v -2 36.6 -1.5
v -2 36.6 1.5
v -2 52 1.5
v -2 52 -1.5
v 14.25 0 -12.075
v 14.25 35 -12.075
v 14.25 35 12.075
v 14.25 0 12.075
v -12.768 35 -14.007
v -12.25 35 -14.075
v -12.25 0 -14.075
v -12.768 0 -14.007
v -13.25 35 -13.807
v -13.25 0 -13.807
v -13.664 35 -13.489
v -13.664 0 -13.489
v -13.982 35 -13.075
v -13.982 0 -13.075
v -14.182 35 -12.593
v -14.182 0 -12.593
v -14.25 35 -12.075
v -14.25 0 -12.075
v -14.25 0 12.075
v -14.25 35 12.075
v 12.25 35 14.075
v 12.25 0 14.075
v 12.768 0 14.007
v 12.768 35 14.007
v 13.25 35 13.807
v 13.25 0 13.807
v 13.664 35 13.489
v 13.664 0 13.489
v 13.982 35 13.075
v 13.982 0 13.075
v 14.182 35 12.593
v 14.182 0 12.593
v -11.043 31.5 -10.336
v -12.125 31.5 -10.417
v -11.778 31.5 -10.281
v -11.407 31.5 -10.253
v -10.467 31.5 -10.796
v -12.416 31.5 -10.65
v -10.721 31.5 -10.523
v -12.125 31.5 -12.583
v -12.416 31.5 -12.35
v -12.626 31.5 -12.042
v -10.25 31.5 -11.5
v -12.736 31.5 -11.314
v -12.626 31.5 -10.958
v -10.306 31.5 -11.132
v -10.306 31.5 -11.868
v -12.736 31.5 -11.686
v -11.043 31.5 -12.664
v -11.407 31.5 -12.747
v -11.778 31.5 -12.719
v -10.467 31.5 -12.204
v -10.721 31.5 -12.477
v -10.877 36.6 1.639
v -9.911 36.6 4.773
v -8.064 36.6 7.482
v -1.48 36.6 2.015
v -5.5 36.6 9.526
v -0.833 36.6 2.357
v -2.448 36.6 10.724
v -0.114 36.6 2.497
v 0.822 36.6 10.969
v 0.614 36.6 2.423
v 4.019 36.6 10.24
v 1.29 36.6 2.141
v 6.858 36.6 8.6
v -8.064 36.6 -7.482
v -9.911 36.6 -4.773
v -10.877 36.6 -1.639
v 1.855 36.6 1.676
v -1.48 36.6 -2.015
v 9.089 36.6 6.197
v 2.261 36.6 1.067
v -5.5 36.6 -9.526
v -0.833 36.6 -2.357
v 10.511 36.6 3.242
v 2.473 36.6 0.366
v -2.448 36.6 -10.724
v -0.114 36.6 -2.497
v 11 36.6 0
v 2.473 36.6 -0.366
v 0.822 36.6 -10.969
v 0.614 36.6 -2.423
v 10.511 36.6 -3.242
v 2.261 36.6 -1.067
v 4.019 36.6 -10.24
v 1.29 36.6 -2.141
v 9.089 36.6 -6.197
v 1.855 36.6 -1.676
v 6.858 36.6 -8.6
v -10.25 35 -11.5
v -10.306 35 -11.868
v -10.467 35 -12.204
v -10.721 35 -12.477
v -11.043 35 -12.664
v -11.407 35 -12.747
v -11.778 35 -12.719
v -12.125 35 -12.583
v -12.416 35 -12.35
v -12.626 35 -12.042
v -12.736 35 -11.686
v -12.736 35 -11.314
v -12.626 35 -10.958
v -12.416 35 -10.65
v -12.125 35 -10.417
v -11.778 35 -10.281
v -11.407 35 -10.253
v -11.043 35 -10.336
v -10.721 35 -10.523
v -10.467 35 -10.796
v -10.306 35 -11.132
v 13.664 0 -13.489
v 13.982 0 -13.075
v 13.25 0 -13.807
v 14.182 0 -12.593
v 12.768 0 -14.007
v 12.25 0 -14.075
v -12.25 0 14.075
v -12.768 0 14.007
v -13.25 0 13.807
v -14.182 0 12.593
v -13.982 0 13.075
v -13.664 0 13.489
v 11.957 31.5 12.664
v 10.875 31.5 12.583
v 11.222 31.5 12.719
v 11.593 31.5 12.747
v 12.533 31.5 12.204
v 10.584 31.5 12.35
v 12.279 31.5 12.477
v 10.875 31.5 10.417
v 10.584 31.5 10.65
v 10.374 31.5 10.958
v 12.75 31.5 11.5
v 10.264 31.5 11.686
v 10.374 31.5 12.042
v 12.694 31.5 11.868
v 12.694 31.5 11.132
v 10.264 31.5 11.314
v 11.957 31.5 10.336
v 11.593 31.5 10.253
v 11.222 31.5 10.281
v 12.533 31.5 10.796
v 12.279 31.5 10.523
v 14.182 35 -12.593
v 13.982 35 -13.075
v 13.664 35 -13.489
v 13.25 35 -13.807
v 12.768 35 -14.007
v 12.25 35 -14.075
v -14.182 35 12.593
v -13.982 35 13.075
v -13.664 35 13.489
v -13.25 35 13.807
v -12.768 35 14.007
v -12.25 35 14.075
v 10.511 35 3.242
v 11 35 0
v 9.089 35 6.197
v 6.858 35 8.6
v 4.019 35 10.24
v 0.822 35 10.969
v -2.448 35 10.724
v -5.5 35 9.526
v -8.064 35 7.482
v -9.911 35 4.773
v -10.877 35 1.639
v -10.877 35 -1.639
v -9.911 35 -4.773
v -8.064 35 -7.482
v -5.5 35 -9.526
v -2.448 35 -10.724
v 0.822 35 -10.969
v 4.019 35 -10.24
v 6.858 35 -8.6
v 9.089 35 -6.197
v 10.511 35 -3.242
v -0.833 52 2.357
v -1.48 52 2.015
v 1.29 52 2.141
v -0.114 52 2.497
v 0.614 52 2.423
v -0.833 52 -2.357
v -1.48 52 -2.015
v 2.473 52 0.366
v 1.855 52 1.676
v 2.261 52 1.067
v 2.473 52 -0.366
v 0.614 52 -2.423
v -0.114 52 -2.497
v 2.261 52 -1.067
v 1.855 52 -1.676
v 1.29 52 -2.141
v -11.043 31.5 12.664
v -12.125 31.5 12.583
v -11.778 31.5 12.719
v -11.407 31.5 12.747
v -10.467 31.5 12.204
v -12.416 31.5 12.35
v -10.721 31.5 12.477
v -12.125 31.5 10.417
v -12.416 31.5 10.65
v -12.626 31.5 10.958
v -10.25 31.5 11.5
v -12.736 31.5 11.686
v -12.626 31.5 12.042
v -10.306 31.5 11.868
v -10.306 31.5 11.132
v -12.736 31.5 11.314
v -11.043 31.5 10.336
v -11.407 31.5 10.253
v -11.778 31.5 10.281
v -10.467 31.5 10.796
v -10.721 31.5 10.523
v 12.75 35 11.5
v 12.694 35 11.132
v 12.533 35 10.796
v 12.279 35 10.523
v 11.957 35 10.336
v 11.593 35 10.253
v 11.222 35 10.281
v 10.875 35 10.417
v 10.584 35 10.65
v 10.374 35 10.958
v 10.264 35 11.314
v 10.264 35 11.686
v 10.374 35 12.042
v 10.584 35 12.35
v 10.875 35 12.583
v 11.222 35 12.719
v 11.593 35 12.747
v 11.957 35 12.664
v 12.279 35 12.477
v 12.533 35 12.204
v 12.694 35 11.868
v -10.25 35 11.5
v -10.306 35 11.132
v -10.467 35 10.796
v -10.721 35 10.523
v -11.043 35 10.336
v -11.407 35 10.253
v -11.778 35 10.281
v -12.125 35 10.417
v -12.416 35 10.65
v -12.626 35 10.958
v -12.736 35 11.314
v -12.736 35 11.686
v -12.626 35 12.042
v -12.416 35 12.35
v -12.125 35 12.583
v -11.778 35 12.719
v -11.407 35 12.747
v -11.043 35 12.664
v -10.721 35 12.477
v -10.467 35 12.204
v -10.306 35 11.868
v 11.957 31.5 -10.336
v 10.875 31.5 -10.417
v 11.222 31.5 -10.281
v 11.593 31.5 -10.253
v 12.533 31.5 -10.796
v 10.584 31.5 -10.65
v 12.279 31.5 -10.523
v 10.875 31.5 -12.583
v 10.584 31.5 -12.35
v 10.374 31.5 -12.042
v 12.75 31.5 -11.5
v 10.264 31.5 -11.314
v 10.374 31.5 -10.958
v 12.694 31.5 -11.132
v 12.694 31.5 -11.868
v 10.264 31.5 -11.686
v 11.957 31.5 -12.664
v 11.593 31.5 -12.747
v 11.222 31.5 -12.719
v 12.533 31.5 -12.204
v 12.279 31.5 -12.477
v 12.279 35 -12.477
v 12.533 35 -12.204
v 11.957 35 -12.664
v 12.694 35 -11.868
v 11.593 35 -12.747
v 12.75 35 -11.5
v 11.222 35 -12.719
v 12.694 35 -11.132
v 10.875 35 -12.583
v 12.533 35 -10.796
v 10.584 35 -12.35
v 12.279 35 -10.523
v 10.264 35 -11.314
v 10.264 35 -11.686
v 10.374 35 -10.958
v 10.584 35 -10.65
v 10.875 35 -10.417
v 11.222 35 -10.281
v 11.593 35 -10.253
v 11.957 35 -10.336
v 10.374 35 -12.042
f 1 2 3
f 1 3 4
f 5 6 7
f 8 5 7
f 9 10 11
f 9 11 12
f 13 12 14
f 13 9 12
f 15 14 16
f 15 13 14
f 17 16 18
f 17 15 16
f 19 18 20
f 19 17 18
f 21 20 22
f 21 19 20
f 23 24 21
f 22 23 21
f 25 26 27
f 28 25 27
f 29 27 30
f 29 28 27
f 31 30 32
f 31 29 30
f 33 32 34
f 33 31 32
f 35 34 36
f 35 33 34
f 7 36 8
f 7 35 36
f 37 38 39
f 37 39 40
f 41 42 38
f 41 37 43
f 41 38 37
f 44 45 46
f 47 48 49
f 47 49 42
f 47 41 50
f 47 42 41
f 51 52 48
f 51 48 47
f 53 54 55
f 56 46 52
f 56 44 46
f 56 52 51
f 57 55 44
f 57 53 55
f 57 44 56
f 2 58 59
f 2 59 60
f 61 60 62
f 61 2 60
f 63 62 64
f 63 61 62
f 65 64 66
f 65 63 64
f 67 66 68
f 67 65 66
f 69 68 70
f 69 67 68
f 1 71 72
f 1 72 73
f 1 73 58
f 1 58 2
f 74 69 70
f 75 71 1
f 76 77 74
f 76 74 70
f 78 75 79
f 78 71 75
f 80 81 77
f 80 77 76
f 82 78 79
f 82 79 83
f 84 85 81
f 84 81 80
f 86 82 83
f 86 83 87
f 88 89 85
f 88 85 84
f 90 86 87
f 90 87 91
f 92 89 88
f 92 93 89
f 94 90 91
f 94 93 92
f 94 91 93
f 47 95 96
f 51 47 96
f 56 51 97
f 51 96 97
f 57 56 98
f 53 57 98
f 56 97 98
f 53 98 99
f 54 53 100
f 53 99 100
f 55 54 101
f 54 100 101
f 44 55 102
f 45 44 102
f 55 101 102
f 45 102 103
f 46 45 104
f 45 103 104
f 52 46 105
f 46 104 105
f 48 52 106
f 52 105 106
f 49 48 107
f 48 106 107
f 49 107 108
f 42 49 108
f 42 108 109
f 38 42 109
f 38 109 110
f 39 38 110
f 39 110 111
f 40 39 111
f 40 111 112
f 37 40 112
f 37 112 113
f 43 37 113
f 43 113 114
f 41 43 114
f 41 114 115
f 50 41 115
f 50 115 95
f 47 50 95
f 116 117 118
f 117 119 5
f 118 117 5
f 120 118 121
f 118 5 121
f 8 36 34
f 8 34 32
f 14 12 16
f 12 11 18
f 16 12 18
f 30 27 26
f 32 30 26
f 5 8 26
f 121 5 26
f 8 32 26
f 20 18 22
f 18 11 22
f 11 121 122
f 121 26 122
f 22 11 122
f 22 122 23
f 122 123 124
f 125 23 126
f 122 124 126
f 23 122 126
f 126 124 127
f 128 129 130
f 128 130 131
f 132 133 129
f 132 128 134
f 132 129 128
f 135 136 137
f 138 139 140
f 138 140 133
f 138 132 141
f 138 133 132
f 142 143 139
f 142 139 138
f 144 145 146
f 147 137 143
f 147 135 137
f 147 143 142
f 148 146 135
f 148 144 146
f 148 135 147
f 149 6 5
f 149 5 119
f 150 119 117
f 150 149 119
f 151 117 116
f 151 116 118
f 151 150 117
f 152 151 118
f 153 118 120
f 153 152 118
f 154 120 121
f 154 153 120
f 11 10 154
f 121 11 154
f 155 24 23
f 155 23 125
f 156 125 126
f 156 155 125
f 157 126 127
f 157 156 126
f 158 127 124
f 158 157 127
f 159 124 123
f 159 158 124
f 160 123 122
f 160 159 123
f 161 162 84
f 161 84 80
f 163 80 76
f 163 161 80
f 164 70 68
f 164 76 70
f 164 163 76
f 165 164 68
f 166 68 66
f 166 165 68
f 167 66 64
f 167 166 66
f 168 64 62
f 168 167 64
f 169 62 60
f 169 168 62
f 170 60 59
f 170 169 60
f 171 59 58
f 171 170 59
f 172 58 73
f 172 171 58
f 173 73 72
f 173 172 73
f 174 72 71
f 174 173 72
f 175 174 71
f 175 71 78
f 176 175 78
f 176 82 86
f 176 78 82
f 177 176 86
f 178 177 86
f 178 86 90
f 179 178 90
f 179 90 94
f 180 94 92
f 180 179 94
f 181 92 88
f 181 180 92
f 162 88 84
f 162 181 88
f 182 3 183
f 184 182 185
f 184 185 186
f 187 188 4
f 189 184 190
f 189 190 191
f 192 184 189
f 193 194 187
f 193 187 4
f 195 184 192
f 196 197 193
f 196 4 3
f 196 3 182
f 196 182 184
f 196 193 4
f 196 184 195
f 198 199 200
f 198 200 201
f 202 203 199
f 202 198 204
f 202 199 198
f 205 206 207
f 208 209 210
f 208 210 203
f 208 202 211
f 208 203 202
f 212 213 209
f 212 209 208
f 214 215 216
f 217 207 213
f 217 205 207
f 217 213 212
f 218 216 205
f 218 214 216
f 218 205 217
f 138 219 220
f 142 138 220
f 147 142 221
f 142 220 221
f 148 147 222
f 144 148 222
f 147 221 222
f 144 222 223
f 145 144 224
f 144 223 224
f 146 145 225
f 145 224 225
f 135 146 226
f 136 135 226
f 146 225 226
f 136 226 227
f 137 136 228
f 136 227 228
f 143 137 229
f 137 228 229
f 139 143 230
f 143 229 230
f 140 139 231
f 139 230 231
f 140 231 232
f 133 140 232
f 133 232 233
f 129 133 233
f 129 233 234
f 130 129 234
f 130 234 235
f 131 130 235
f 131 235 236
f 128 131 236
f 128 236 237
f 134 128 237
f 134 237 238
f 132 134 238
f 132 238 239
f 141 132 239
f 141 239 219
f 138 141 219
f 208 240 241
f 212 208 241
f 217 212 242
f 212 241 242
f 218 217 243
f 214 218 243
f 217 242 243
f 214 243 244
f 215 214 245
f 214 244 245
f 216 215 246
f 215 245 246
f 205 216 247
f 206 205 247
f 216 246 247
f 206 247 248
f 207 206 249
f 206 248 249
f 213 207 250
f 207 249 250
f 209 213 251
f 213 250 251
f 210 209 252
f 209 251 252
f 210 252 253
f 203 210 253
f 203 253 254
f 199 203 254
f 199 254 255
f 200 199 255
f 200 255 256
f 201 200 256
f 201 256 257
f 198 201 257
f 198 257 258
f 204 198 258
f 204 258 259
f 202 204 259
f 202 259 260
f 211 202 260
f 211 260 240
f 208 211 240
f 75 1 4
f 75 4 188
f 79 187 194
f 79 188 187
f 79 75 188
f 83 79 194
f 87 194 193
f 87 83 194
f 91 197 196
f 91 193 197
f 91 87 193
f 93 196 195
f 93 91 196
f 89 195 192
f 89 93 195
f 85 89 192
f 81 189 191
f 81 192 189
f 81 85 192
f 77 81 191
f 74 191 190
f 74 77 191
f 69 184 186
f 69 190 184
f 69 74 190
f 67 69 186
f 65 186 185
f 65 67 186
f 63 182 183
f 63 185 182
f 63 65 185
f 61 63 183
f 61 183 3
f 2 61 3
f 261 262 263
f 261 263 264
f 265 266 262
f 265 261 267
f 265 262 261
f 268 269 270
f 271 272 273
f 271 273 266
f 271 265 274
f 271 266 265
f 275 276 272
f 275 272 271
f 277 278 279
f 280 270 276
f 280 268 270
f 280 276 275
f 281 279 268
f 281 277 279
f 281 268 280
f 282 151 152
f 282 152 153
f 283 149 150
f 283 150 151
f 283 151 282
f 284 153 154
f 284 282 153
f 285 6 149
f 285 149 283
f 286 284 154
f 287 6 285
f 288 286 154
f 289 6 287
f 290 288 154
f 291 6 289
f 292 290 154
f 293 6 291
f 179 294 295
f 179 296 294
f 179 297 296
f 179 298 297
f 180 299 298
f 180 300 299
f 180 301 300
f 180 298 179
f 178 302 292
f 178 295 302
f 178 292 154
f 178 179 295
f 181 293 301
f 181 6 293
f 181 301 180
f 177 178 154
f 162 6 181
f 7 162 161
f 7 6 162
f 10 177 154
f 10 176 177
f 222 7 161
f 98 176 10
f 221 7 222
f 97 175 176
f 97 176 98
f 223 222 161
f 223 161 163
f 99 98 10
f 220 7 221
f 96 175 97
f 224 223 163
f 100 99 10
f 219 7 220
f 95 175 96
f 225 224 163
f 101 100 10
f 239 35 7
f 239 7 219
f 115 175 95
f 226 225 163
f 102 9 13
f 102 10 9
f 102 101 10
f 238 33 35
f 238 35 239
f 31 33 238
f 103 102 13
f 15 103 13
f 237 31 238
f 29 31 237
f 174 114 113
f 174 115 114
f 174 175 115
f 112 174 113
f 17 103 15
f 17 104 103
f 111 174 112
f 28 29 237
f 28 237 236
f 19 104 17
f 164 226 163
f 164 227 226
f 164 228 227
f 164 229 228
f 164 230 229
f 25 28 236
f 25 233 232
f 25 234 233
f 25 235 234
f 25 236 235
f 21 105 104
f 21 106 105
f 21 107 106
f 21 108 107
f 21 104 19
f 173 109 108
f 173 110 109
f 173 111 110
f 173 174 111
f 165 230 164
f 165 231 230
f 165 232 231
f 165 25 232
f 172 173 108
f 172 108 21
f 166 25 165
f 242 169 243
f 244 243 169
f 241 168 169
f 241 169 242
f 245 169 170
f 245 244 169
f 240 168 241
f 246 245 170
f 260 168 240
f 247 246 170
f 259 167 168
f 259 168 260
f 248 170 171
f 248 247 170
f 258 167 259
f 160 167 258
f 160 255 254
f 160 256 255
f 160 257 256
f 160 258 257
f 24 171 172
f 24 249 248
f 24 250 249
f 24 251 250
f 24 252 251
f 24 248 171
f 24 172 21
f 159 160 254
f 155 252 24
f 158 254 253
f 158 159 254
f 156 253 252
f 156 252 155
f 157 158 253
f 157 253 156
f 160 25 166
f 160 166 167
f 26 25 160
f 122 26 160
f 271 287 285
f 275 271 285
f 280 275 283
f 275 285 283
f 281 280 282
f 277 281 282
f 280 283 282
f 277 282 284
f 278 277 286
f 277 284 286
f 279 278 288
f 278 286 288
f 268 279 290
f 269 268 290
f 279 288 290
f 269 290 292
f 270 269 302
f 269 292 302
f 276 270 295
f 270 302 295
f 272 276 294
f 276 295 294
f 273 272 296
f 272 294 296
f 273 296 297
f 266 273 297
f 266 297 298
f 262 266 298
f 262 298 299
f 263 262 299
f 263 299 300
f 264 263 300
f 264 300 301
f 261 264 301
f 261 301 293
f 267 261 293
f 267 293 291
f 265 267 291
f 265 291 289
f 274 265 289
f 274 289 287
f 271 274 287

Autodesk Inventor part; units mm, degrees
ref_plane "YZ Plane" through (0, 0, 0) normal (1, 0, 0) x (0, 1, 0)
ref_plane "XZ Plane" through (0, 0, 0) normal (0, 1, 0) x (-1, 0, 0)
ref_plane "XY Plane" through (0, 0, 0) normal (0, 0, 1) x (1, 0, 0)
sketch "草圖1" plane through (0, 0, 0) normal (0, 1, 0) x (-1, 0, 0)
  line L0 (-14.25, 14.075) -> (14.25, 14.075)
  line L1 (14.25, 14.075) -> (14.25, -14.075)
  line L2 (14.25, -14.075) -> (-14.25, -14.075)
  line L3 (-14.25, -14.075) -> (-14.25, 14.075)
  line L4 (-14.25, 14.075) -> (14.25, -14.075) construction
  line L5 (14.25, 14.075) -> (-14.25, -14.075) construction
  point P0 (0, 0)
  dimension "d0" = 28.5
  dimension "d1" = 28.15
extrude "擠出1" add sketch "草圖1" along normal blind 35
sketch "草圖2" plane through (0, 35, 0) normal (0, 1, 0) x (1, 0, 0)
  circle A0 centre (0, 0) radius 11
  dimension "d4" = 22
extrude "擠出2" add sketch "草圖2" along normal blind 1.6
sketch "草圖3" plane through (0, 36.6, 0) normal (0, 1, 0) x (1, 0, 0)
  arc A0 (-2, -1.5) -> (-2, 1.5) centre (0, 0) ccw
  line L0 (-2, -1.5) -> (-2, 1.5)
  dimension "d7" = 5
  dimension "d8" = 2
extrude "擠出3" add sketch "草圖3" along normal blind 15.4
sketch "草圖4" plane through (0, 35, 0) normal (0, 1, 0) x (1, 0, 0)
  line L0 (11.5, -11.5) -> (-11.5, -11.5) construction
  line L1 (-11.5, -11.5) -> (-11.5, 11.5) construction
  line L2 (-11.5, 11.5) -> (11.5, 11.5) construction
  line L3 (11.5, 11.5) -> (11.5, -11.5) construction
  arc A0 (-2, -1.5) -> (-2, 1.5) centre (0, 0) ccw construction
  line L4 (11.5, -11.5) -> (-11.5, 11.5) construction
  line L5 (-11.5, -11.5) -> (11.5, 11.5) construction
  circle A1 centre (-11.5, 11.5) radius 1.25
  circle A2 centre (-11.5, -11.5) radius 1.25
  circle A3 centre (11.5, -11.5) radius 1.25
  circle A4 centre (11.5, 11.5) radius 1.25
  dimension "d11" = 23
  dimension "d12" = 23
  dimension "d13" = 2.5
  dimension "d16" = 360
extrude "擠出4" cut sketch "草圖4" against normal blind 3.5
fillet "圓角1" radius 2 4 edges at (14.25, 17.5, 14.075) (14.25, 17.5, -14.075) (-14.25, 17.5, 14.075) (-14.25, 17.5, -14.075)
sketch "草圖5" plane through (0, 52, 0) normal (0, 1, 0) x (1, 0, 0)
  arc A0 (-2, -1.5) -> (-2, 1.5) centre (0, 0) ccw projected
properties part number "nema 11x35"
